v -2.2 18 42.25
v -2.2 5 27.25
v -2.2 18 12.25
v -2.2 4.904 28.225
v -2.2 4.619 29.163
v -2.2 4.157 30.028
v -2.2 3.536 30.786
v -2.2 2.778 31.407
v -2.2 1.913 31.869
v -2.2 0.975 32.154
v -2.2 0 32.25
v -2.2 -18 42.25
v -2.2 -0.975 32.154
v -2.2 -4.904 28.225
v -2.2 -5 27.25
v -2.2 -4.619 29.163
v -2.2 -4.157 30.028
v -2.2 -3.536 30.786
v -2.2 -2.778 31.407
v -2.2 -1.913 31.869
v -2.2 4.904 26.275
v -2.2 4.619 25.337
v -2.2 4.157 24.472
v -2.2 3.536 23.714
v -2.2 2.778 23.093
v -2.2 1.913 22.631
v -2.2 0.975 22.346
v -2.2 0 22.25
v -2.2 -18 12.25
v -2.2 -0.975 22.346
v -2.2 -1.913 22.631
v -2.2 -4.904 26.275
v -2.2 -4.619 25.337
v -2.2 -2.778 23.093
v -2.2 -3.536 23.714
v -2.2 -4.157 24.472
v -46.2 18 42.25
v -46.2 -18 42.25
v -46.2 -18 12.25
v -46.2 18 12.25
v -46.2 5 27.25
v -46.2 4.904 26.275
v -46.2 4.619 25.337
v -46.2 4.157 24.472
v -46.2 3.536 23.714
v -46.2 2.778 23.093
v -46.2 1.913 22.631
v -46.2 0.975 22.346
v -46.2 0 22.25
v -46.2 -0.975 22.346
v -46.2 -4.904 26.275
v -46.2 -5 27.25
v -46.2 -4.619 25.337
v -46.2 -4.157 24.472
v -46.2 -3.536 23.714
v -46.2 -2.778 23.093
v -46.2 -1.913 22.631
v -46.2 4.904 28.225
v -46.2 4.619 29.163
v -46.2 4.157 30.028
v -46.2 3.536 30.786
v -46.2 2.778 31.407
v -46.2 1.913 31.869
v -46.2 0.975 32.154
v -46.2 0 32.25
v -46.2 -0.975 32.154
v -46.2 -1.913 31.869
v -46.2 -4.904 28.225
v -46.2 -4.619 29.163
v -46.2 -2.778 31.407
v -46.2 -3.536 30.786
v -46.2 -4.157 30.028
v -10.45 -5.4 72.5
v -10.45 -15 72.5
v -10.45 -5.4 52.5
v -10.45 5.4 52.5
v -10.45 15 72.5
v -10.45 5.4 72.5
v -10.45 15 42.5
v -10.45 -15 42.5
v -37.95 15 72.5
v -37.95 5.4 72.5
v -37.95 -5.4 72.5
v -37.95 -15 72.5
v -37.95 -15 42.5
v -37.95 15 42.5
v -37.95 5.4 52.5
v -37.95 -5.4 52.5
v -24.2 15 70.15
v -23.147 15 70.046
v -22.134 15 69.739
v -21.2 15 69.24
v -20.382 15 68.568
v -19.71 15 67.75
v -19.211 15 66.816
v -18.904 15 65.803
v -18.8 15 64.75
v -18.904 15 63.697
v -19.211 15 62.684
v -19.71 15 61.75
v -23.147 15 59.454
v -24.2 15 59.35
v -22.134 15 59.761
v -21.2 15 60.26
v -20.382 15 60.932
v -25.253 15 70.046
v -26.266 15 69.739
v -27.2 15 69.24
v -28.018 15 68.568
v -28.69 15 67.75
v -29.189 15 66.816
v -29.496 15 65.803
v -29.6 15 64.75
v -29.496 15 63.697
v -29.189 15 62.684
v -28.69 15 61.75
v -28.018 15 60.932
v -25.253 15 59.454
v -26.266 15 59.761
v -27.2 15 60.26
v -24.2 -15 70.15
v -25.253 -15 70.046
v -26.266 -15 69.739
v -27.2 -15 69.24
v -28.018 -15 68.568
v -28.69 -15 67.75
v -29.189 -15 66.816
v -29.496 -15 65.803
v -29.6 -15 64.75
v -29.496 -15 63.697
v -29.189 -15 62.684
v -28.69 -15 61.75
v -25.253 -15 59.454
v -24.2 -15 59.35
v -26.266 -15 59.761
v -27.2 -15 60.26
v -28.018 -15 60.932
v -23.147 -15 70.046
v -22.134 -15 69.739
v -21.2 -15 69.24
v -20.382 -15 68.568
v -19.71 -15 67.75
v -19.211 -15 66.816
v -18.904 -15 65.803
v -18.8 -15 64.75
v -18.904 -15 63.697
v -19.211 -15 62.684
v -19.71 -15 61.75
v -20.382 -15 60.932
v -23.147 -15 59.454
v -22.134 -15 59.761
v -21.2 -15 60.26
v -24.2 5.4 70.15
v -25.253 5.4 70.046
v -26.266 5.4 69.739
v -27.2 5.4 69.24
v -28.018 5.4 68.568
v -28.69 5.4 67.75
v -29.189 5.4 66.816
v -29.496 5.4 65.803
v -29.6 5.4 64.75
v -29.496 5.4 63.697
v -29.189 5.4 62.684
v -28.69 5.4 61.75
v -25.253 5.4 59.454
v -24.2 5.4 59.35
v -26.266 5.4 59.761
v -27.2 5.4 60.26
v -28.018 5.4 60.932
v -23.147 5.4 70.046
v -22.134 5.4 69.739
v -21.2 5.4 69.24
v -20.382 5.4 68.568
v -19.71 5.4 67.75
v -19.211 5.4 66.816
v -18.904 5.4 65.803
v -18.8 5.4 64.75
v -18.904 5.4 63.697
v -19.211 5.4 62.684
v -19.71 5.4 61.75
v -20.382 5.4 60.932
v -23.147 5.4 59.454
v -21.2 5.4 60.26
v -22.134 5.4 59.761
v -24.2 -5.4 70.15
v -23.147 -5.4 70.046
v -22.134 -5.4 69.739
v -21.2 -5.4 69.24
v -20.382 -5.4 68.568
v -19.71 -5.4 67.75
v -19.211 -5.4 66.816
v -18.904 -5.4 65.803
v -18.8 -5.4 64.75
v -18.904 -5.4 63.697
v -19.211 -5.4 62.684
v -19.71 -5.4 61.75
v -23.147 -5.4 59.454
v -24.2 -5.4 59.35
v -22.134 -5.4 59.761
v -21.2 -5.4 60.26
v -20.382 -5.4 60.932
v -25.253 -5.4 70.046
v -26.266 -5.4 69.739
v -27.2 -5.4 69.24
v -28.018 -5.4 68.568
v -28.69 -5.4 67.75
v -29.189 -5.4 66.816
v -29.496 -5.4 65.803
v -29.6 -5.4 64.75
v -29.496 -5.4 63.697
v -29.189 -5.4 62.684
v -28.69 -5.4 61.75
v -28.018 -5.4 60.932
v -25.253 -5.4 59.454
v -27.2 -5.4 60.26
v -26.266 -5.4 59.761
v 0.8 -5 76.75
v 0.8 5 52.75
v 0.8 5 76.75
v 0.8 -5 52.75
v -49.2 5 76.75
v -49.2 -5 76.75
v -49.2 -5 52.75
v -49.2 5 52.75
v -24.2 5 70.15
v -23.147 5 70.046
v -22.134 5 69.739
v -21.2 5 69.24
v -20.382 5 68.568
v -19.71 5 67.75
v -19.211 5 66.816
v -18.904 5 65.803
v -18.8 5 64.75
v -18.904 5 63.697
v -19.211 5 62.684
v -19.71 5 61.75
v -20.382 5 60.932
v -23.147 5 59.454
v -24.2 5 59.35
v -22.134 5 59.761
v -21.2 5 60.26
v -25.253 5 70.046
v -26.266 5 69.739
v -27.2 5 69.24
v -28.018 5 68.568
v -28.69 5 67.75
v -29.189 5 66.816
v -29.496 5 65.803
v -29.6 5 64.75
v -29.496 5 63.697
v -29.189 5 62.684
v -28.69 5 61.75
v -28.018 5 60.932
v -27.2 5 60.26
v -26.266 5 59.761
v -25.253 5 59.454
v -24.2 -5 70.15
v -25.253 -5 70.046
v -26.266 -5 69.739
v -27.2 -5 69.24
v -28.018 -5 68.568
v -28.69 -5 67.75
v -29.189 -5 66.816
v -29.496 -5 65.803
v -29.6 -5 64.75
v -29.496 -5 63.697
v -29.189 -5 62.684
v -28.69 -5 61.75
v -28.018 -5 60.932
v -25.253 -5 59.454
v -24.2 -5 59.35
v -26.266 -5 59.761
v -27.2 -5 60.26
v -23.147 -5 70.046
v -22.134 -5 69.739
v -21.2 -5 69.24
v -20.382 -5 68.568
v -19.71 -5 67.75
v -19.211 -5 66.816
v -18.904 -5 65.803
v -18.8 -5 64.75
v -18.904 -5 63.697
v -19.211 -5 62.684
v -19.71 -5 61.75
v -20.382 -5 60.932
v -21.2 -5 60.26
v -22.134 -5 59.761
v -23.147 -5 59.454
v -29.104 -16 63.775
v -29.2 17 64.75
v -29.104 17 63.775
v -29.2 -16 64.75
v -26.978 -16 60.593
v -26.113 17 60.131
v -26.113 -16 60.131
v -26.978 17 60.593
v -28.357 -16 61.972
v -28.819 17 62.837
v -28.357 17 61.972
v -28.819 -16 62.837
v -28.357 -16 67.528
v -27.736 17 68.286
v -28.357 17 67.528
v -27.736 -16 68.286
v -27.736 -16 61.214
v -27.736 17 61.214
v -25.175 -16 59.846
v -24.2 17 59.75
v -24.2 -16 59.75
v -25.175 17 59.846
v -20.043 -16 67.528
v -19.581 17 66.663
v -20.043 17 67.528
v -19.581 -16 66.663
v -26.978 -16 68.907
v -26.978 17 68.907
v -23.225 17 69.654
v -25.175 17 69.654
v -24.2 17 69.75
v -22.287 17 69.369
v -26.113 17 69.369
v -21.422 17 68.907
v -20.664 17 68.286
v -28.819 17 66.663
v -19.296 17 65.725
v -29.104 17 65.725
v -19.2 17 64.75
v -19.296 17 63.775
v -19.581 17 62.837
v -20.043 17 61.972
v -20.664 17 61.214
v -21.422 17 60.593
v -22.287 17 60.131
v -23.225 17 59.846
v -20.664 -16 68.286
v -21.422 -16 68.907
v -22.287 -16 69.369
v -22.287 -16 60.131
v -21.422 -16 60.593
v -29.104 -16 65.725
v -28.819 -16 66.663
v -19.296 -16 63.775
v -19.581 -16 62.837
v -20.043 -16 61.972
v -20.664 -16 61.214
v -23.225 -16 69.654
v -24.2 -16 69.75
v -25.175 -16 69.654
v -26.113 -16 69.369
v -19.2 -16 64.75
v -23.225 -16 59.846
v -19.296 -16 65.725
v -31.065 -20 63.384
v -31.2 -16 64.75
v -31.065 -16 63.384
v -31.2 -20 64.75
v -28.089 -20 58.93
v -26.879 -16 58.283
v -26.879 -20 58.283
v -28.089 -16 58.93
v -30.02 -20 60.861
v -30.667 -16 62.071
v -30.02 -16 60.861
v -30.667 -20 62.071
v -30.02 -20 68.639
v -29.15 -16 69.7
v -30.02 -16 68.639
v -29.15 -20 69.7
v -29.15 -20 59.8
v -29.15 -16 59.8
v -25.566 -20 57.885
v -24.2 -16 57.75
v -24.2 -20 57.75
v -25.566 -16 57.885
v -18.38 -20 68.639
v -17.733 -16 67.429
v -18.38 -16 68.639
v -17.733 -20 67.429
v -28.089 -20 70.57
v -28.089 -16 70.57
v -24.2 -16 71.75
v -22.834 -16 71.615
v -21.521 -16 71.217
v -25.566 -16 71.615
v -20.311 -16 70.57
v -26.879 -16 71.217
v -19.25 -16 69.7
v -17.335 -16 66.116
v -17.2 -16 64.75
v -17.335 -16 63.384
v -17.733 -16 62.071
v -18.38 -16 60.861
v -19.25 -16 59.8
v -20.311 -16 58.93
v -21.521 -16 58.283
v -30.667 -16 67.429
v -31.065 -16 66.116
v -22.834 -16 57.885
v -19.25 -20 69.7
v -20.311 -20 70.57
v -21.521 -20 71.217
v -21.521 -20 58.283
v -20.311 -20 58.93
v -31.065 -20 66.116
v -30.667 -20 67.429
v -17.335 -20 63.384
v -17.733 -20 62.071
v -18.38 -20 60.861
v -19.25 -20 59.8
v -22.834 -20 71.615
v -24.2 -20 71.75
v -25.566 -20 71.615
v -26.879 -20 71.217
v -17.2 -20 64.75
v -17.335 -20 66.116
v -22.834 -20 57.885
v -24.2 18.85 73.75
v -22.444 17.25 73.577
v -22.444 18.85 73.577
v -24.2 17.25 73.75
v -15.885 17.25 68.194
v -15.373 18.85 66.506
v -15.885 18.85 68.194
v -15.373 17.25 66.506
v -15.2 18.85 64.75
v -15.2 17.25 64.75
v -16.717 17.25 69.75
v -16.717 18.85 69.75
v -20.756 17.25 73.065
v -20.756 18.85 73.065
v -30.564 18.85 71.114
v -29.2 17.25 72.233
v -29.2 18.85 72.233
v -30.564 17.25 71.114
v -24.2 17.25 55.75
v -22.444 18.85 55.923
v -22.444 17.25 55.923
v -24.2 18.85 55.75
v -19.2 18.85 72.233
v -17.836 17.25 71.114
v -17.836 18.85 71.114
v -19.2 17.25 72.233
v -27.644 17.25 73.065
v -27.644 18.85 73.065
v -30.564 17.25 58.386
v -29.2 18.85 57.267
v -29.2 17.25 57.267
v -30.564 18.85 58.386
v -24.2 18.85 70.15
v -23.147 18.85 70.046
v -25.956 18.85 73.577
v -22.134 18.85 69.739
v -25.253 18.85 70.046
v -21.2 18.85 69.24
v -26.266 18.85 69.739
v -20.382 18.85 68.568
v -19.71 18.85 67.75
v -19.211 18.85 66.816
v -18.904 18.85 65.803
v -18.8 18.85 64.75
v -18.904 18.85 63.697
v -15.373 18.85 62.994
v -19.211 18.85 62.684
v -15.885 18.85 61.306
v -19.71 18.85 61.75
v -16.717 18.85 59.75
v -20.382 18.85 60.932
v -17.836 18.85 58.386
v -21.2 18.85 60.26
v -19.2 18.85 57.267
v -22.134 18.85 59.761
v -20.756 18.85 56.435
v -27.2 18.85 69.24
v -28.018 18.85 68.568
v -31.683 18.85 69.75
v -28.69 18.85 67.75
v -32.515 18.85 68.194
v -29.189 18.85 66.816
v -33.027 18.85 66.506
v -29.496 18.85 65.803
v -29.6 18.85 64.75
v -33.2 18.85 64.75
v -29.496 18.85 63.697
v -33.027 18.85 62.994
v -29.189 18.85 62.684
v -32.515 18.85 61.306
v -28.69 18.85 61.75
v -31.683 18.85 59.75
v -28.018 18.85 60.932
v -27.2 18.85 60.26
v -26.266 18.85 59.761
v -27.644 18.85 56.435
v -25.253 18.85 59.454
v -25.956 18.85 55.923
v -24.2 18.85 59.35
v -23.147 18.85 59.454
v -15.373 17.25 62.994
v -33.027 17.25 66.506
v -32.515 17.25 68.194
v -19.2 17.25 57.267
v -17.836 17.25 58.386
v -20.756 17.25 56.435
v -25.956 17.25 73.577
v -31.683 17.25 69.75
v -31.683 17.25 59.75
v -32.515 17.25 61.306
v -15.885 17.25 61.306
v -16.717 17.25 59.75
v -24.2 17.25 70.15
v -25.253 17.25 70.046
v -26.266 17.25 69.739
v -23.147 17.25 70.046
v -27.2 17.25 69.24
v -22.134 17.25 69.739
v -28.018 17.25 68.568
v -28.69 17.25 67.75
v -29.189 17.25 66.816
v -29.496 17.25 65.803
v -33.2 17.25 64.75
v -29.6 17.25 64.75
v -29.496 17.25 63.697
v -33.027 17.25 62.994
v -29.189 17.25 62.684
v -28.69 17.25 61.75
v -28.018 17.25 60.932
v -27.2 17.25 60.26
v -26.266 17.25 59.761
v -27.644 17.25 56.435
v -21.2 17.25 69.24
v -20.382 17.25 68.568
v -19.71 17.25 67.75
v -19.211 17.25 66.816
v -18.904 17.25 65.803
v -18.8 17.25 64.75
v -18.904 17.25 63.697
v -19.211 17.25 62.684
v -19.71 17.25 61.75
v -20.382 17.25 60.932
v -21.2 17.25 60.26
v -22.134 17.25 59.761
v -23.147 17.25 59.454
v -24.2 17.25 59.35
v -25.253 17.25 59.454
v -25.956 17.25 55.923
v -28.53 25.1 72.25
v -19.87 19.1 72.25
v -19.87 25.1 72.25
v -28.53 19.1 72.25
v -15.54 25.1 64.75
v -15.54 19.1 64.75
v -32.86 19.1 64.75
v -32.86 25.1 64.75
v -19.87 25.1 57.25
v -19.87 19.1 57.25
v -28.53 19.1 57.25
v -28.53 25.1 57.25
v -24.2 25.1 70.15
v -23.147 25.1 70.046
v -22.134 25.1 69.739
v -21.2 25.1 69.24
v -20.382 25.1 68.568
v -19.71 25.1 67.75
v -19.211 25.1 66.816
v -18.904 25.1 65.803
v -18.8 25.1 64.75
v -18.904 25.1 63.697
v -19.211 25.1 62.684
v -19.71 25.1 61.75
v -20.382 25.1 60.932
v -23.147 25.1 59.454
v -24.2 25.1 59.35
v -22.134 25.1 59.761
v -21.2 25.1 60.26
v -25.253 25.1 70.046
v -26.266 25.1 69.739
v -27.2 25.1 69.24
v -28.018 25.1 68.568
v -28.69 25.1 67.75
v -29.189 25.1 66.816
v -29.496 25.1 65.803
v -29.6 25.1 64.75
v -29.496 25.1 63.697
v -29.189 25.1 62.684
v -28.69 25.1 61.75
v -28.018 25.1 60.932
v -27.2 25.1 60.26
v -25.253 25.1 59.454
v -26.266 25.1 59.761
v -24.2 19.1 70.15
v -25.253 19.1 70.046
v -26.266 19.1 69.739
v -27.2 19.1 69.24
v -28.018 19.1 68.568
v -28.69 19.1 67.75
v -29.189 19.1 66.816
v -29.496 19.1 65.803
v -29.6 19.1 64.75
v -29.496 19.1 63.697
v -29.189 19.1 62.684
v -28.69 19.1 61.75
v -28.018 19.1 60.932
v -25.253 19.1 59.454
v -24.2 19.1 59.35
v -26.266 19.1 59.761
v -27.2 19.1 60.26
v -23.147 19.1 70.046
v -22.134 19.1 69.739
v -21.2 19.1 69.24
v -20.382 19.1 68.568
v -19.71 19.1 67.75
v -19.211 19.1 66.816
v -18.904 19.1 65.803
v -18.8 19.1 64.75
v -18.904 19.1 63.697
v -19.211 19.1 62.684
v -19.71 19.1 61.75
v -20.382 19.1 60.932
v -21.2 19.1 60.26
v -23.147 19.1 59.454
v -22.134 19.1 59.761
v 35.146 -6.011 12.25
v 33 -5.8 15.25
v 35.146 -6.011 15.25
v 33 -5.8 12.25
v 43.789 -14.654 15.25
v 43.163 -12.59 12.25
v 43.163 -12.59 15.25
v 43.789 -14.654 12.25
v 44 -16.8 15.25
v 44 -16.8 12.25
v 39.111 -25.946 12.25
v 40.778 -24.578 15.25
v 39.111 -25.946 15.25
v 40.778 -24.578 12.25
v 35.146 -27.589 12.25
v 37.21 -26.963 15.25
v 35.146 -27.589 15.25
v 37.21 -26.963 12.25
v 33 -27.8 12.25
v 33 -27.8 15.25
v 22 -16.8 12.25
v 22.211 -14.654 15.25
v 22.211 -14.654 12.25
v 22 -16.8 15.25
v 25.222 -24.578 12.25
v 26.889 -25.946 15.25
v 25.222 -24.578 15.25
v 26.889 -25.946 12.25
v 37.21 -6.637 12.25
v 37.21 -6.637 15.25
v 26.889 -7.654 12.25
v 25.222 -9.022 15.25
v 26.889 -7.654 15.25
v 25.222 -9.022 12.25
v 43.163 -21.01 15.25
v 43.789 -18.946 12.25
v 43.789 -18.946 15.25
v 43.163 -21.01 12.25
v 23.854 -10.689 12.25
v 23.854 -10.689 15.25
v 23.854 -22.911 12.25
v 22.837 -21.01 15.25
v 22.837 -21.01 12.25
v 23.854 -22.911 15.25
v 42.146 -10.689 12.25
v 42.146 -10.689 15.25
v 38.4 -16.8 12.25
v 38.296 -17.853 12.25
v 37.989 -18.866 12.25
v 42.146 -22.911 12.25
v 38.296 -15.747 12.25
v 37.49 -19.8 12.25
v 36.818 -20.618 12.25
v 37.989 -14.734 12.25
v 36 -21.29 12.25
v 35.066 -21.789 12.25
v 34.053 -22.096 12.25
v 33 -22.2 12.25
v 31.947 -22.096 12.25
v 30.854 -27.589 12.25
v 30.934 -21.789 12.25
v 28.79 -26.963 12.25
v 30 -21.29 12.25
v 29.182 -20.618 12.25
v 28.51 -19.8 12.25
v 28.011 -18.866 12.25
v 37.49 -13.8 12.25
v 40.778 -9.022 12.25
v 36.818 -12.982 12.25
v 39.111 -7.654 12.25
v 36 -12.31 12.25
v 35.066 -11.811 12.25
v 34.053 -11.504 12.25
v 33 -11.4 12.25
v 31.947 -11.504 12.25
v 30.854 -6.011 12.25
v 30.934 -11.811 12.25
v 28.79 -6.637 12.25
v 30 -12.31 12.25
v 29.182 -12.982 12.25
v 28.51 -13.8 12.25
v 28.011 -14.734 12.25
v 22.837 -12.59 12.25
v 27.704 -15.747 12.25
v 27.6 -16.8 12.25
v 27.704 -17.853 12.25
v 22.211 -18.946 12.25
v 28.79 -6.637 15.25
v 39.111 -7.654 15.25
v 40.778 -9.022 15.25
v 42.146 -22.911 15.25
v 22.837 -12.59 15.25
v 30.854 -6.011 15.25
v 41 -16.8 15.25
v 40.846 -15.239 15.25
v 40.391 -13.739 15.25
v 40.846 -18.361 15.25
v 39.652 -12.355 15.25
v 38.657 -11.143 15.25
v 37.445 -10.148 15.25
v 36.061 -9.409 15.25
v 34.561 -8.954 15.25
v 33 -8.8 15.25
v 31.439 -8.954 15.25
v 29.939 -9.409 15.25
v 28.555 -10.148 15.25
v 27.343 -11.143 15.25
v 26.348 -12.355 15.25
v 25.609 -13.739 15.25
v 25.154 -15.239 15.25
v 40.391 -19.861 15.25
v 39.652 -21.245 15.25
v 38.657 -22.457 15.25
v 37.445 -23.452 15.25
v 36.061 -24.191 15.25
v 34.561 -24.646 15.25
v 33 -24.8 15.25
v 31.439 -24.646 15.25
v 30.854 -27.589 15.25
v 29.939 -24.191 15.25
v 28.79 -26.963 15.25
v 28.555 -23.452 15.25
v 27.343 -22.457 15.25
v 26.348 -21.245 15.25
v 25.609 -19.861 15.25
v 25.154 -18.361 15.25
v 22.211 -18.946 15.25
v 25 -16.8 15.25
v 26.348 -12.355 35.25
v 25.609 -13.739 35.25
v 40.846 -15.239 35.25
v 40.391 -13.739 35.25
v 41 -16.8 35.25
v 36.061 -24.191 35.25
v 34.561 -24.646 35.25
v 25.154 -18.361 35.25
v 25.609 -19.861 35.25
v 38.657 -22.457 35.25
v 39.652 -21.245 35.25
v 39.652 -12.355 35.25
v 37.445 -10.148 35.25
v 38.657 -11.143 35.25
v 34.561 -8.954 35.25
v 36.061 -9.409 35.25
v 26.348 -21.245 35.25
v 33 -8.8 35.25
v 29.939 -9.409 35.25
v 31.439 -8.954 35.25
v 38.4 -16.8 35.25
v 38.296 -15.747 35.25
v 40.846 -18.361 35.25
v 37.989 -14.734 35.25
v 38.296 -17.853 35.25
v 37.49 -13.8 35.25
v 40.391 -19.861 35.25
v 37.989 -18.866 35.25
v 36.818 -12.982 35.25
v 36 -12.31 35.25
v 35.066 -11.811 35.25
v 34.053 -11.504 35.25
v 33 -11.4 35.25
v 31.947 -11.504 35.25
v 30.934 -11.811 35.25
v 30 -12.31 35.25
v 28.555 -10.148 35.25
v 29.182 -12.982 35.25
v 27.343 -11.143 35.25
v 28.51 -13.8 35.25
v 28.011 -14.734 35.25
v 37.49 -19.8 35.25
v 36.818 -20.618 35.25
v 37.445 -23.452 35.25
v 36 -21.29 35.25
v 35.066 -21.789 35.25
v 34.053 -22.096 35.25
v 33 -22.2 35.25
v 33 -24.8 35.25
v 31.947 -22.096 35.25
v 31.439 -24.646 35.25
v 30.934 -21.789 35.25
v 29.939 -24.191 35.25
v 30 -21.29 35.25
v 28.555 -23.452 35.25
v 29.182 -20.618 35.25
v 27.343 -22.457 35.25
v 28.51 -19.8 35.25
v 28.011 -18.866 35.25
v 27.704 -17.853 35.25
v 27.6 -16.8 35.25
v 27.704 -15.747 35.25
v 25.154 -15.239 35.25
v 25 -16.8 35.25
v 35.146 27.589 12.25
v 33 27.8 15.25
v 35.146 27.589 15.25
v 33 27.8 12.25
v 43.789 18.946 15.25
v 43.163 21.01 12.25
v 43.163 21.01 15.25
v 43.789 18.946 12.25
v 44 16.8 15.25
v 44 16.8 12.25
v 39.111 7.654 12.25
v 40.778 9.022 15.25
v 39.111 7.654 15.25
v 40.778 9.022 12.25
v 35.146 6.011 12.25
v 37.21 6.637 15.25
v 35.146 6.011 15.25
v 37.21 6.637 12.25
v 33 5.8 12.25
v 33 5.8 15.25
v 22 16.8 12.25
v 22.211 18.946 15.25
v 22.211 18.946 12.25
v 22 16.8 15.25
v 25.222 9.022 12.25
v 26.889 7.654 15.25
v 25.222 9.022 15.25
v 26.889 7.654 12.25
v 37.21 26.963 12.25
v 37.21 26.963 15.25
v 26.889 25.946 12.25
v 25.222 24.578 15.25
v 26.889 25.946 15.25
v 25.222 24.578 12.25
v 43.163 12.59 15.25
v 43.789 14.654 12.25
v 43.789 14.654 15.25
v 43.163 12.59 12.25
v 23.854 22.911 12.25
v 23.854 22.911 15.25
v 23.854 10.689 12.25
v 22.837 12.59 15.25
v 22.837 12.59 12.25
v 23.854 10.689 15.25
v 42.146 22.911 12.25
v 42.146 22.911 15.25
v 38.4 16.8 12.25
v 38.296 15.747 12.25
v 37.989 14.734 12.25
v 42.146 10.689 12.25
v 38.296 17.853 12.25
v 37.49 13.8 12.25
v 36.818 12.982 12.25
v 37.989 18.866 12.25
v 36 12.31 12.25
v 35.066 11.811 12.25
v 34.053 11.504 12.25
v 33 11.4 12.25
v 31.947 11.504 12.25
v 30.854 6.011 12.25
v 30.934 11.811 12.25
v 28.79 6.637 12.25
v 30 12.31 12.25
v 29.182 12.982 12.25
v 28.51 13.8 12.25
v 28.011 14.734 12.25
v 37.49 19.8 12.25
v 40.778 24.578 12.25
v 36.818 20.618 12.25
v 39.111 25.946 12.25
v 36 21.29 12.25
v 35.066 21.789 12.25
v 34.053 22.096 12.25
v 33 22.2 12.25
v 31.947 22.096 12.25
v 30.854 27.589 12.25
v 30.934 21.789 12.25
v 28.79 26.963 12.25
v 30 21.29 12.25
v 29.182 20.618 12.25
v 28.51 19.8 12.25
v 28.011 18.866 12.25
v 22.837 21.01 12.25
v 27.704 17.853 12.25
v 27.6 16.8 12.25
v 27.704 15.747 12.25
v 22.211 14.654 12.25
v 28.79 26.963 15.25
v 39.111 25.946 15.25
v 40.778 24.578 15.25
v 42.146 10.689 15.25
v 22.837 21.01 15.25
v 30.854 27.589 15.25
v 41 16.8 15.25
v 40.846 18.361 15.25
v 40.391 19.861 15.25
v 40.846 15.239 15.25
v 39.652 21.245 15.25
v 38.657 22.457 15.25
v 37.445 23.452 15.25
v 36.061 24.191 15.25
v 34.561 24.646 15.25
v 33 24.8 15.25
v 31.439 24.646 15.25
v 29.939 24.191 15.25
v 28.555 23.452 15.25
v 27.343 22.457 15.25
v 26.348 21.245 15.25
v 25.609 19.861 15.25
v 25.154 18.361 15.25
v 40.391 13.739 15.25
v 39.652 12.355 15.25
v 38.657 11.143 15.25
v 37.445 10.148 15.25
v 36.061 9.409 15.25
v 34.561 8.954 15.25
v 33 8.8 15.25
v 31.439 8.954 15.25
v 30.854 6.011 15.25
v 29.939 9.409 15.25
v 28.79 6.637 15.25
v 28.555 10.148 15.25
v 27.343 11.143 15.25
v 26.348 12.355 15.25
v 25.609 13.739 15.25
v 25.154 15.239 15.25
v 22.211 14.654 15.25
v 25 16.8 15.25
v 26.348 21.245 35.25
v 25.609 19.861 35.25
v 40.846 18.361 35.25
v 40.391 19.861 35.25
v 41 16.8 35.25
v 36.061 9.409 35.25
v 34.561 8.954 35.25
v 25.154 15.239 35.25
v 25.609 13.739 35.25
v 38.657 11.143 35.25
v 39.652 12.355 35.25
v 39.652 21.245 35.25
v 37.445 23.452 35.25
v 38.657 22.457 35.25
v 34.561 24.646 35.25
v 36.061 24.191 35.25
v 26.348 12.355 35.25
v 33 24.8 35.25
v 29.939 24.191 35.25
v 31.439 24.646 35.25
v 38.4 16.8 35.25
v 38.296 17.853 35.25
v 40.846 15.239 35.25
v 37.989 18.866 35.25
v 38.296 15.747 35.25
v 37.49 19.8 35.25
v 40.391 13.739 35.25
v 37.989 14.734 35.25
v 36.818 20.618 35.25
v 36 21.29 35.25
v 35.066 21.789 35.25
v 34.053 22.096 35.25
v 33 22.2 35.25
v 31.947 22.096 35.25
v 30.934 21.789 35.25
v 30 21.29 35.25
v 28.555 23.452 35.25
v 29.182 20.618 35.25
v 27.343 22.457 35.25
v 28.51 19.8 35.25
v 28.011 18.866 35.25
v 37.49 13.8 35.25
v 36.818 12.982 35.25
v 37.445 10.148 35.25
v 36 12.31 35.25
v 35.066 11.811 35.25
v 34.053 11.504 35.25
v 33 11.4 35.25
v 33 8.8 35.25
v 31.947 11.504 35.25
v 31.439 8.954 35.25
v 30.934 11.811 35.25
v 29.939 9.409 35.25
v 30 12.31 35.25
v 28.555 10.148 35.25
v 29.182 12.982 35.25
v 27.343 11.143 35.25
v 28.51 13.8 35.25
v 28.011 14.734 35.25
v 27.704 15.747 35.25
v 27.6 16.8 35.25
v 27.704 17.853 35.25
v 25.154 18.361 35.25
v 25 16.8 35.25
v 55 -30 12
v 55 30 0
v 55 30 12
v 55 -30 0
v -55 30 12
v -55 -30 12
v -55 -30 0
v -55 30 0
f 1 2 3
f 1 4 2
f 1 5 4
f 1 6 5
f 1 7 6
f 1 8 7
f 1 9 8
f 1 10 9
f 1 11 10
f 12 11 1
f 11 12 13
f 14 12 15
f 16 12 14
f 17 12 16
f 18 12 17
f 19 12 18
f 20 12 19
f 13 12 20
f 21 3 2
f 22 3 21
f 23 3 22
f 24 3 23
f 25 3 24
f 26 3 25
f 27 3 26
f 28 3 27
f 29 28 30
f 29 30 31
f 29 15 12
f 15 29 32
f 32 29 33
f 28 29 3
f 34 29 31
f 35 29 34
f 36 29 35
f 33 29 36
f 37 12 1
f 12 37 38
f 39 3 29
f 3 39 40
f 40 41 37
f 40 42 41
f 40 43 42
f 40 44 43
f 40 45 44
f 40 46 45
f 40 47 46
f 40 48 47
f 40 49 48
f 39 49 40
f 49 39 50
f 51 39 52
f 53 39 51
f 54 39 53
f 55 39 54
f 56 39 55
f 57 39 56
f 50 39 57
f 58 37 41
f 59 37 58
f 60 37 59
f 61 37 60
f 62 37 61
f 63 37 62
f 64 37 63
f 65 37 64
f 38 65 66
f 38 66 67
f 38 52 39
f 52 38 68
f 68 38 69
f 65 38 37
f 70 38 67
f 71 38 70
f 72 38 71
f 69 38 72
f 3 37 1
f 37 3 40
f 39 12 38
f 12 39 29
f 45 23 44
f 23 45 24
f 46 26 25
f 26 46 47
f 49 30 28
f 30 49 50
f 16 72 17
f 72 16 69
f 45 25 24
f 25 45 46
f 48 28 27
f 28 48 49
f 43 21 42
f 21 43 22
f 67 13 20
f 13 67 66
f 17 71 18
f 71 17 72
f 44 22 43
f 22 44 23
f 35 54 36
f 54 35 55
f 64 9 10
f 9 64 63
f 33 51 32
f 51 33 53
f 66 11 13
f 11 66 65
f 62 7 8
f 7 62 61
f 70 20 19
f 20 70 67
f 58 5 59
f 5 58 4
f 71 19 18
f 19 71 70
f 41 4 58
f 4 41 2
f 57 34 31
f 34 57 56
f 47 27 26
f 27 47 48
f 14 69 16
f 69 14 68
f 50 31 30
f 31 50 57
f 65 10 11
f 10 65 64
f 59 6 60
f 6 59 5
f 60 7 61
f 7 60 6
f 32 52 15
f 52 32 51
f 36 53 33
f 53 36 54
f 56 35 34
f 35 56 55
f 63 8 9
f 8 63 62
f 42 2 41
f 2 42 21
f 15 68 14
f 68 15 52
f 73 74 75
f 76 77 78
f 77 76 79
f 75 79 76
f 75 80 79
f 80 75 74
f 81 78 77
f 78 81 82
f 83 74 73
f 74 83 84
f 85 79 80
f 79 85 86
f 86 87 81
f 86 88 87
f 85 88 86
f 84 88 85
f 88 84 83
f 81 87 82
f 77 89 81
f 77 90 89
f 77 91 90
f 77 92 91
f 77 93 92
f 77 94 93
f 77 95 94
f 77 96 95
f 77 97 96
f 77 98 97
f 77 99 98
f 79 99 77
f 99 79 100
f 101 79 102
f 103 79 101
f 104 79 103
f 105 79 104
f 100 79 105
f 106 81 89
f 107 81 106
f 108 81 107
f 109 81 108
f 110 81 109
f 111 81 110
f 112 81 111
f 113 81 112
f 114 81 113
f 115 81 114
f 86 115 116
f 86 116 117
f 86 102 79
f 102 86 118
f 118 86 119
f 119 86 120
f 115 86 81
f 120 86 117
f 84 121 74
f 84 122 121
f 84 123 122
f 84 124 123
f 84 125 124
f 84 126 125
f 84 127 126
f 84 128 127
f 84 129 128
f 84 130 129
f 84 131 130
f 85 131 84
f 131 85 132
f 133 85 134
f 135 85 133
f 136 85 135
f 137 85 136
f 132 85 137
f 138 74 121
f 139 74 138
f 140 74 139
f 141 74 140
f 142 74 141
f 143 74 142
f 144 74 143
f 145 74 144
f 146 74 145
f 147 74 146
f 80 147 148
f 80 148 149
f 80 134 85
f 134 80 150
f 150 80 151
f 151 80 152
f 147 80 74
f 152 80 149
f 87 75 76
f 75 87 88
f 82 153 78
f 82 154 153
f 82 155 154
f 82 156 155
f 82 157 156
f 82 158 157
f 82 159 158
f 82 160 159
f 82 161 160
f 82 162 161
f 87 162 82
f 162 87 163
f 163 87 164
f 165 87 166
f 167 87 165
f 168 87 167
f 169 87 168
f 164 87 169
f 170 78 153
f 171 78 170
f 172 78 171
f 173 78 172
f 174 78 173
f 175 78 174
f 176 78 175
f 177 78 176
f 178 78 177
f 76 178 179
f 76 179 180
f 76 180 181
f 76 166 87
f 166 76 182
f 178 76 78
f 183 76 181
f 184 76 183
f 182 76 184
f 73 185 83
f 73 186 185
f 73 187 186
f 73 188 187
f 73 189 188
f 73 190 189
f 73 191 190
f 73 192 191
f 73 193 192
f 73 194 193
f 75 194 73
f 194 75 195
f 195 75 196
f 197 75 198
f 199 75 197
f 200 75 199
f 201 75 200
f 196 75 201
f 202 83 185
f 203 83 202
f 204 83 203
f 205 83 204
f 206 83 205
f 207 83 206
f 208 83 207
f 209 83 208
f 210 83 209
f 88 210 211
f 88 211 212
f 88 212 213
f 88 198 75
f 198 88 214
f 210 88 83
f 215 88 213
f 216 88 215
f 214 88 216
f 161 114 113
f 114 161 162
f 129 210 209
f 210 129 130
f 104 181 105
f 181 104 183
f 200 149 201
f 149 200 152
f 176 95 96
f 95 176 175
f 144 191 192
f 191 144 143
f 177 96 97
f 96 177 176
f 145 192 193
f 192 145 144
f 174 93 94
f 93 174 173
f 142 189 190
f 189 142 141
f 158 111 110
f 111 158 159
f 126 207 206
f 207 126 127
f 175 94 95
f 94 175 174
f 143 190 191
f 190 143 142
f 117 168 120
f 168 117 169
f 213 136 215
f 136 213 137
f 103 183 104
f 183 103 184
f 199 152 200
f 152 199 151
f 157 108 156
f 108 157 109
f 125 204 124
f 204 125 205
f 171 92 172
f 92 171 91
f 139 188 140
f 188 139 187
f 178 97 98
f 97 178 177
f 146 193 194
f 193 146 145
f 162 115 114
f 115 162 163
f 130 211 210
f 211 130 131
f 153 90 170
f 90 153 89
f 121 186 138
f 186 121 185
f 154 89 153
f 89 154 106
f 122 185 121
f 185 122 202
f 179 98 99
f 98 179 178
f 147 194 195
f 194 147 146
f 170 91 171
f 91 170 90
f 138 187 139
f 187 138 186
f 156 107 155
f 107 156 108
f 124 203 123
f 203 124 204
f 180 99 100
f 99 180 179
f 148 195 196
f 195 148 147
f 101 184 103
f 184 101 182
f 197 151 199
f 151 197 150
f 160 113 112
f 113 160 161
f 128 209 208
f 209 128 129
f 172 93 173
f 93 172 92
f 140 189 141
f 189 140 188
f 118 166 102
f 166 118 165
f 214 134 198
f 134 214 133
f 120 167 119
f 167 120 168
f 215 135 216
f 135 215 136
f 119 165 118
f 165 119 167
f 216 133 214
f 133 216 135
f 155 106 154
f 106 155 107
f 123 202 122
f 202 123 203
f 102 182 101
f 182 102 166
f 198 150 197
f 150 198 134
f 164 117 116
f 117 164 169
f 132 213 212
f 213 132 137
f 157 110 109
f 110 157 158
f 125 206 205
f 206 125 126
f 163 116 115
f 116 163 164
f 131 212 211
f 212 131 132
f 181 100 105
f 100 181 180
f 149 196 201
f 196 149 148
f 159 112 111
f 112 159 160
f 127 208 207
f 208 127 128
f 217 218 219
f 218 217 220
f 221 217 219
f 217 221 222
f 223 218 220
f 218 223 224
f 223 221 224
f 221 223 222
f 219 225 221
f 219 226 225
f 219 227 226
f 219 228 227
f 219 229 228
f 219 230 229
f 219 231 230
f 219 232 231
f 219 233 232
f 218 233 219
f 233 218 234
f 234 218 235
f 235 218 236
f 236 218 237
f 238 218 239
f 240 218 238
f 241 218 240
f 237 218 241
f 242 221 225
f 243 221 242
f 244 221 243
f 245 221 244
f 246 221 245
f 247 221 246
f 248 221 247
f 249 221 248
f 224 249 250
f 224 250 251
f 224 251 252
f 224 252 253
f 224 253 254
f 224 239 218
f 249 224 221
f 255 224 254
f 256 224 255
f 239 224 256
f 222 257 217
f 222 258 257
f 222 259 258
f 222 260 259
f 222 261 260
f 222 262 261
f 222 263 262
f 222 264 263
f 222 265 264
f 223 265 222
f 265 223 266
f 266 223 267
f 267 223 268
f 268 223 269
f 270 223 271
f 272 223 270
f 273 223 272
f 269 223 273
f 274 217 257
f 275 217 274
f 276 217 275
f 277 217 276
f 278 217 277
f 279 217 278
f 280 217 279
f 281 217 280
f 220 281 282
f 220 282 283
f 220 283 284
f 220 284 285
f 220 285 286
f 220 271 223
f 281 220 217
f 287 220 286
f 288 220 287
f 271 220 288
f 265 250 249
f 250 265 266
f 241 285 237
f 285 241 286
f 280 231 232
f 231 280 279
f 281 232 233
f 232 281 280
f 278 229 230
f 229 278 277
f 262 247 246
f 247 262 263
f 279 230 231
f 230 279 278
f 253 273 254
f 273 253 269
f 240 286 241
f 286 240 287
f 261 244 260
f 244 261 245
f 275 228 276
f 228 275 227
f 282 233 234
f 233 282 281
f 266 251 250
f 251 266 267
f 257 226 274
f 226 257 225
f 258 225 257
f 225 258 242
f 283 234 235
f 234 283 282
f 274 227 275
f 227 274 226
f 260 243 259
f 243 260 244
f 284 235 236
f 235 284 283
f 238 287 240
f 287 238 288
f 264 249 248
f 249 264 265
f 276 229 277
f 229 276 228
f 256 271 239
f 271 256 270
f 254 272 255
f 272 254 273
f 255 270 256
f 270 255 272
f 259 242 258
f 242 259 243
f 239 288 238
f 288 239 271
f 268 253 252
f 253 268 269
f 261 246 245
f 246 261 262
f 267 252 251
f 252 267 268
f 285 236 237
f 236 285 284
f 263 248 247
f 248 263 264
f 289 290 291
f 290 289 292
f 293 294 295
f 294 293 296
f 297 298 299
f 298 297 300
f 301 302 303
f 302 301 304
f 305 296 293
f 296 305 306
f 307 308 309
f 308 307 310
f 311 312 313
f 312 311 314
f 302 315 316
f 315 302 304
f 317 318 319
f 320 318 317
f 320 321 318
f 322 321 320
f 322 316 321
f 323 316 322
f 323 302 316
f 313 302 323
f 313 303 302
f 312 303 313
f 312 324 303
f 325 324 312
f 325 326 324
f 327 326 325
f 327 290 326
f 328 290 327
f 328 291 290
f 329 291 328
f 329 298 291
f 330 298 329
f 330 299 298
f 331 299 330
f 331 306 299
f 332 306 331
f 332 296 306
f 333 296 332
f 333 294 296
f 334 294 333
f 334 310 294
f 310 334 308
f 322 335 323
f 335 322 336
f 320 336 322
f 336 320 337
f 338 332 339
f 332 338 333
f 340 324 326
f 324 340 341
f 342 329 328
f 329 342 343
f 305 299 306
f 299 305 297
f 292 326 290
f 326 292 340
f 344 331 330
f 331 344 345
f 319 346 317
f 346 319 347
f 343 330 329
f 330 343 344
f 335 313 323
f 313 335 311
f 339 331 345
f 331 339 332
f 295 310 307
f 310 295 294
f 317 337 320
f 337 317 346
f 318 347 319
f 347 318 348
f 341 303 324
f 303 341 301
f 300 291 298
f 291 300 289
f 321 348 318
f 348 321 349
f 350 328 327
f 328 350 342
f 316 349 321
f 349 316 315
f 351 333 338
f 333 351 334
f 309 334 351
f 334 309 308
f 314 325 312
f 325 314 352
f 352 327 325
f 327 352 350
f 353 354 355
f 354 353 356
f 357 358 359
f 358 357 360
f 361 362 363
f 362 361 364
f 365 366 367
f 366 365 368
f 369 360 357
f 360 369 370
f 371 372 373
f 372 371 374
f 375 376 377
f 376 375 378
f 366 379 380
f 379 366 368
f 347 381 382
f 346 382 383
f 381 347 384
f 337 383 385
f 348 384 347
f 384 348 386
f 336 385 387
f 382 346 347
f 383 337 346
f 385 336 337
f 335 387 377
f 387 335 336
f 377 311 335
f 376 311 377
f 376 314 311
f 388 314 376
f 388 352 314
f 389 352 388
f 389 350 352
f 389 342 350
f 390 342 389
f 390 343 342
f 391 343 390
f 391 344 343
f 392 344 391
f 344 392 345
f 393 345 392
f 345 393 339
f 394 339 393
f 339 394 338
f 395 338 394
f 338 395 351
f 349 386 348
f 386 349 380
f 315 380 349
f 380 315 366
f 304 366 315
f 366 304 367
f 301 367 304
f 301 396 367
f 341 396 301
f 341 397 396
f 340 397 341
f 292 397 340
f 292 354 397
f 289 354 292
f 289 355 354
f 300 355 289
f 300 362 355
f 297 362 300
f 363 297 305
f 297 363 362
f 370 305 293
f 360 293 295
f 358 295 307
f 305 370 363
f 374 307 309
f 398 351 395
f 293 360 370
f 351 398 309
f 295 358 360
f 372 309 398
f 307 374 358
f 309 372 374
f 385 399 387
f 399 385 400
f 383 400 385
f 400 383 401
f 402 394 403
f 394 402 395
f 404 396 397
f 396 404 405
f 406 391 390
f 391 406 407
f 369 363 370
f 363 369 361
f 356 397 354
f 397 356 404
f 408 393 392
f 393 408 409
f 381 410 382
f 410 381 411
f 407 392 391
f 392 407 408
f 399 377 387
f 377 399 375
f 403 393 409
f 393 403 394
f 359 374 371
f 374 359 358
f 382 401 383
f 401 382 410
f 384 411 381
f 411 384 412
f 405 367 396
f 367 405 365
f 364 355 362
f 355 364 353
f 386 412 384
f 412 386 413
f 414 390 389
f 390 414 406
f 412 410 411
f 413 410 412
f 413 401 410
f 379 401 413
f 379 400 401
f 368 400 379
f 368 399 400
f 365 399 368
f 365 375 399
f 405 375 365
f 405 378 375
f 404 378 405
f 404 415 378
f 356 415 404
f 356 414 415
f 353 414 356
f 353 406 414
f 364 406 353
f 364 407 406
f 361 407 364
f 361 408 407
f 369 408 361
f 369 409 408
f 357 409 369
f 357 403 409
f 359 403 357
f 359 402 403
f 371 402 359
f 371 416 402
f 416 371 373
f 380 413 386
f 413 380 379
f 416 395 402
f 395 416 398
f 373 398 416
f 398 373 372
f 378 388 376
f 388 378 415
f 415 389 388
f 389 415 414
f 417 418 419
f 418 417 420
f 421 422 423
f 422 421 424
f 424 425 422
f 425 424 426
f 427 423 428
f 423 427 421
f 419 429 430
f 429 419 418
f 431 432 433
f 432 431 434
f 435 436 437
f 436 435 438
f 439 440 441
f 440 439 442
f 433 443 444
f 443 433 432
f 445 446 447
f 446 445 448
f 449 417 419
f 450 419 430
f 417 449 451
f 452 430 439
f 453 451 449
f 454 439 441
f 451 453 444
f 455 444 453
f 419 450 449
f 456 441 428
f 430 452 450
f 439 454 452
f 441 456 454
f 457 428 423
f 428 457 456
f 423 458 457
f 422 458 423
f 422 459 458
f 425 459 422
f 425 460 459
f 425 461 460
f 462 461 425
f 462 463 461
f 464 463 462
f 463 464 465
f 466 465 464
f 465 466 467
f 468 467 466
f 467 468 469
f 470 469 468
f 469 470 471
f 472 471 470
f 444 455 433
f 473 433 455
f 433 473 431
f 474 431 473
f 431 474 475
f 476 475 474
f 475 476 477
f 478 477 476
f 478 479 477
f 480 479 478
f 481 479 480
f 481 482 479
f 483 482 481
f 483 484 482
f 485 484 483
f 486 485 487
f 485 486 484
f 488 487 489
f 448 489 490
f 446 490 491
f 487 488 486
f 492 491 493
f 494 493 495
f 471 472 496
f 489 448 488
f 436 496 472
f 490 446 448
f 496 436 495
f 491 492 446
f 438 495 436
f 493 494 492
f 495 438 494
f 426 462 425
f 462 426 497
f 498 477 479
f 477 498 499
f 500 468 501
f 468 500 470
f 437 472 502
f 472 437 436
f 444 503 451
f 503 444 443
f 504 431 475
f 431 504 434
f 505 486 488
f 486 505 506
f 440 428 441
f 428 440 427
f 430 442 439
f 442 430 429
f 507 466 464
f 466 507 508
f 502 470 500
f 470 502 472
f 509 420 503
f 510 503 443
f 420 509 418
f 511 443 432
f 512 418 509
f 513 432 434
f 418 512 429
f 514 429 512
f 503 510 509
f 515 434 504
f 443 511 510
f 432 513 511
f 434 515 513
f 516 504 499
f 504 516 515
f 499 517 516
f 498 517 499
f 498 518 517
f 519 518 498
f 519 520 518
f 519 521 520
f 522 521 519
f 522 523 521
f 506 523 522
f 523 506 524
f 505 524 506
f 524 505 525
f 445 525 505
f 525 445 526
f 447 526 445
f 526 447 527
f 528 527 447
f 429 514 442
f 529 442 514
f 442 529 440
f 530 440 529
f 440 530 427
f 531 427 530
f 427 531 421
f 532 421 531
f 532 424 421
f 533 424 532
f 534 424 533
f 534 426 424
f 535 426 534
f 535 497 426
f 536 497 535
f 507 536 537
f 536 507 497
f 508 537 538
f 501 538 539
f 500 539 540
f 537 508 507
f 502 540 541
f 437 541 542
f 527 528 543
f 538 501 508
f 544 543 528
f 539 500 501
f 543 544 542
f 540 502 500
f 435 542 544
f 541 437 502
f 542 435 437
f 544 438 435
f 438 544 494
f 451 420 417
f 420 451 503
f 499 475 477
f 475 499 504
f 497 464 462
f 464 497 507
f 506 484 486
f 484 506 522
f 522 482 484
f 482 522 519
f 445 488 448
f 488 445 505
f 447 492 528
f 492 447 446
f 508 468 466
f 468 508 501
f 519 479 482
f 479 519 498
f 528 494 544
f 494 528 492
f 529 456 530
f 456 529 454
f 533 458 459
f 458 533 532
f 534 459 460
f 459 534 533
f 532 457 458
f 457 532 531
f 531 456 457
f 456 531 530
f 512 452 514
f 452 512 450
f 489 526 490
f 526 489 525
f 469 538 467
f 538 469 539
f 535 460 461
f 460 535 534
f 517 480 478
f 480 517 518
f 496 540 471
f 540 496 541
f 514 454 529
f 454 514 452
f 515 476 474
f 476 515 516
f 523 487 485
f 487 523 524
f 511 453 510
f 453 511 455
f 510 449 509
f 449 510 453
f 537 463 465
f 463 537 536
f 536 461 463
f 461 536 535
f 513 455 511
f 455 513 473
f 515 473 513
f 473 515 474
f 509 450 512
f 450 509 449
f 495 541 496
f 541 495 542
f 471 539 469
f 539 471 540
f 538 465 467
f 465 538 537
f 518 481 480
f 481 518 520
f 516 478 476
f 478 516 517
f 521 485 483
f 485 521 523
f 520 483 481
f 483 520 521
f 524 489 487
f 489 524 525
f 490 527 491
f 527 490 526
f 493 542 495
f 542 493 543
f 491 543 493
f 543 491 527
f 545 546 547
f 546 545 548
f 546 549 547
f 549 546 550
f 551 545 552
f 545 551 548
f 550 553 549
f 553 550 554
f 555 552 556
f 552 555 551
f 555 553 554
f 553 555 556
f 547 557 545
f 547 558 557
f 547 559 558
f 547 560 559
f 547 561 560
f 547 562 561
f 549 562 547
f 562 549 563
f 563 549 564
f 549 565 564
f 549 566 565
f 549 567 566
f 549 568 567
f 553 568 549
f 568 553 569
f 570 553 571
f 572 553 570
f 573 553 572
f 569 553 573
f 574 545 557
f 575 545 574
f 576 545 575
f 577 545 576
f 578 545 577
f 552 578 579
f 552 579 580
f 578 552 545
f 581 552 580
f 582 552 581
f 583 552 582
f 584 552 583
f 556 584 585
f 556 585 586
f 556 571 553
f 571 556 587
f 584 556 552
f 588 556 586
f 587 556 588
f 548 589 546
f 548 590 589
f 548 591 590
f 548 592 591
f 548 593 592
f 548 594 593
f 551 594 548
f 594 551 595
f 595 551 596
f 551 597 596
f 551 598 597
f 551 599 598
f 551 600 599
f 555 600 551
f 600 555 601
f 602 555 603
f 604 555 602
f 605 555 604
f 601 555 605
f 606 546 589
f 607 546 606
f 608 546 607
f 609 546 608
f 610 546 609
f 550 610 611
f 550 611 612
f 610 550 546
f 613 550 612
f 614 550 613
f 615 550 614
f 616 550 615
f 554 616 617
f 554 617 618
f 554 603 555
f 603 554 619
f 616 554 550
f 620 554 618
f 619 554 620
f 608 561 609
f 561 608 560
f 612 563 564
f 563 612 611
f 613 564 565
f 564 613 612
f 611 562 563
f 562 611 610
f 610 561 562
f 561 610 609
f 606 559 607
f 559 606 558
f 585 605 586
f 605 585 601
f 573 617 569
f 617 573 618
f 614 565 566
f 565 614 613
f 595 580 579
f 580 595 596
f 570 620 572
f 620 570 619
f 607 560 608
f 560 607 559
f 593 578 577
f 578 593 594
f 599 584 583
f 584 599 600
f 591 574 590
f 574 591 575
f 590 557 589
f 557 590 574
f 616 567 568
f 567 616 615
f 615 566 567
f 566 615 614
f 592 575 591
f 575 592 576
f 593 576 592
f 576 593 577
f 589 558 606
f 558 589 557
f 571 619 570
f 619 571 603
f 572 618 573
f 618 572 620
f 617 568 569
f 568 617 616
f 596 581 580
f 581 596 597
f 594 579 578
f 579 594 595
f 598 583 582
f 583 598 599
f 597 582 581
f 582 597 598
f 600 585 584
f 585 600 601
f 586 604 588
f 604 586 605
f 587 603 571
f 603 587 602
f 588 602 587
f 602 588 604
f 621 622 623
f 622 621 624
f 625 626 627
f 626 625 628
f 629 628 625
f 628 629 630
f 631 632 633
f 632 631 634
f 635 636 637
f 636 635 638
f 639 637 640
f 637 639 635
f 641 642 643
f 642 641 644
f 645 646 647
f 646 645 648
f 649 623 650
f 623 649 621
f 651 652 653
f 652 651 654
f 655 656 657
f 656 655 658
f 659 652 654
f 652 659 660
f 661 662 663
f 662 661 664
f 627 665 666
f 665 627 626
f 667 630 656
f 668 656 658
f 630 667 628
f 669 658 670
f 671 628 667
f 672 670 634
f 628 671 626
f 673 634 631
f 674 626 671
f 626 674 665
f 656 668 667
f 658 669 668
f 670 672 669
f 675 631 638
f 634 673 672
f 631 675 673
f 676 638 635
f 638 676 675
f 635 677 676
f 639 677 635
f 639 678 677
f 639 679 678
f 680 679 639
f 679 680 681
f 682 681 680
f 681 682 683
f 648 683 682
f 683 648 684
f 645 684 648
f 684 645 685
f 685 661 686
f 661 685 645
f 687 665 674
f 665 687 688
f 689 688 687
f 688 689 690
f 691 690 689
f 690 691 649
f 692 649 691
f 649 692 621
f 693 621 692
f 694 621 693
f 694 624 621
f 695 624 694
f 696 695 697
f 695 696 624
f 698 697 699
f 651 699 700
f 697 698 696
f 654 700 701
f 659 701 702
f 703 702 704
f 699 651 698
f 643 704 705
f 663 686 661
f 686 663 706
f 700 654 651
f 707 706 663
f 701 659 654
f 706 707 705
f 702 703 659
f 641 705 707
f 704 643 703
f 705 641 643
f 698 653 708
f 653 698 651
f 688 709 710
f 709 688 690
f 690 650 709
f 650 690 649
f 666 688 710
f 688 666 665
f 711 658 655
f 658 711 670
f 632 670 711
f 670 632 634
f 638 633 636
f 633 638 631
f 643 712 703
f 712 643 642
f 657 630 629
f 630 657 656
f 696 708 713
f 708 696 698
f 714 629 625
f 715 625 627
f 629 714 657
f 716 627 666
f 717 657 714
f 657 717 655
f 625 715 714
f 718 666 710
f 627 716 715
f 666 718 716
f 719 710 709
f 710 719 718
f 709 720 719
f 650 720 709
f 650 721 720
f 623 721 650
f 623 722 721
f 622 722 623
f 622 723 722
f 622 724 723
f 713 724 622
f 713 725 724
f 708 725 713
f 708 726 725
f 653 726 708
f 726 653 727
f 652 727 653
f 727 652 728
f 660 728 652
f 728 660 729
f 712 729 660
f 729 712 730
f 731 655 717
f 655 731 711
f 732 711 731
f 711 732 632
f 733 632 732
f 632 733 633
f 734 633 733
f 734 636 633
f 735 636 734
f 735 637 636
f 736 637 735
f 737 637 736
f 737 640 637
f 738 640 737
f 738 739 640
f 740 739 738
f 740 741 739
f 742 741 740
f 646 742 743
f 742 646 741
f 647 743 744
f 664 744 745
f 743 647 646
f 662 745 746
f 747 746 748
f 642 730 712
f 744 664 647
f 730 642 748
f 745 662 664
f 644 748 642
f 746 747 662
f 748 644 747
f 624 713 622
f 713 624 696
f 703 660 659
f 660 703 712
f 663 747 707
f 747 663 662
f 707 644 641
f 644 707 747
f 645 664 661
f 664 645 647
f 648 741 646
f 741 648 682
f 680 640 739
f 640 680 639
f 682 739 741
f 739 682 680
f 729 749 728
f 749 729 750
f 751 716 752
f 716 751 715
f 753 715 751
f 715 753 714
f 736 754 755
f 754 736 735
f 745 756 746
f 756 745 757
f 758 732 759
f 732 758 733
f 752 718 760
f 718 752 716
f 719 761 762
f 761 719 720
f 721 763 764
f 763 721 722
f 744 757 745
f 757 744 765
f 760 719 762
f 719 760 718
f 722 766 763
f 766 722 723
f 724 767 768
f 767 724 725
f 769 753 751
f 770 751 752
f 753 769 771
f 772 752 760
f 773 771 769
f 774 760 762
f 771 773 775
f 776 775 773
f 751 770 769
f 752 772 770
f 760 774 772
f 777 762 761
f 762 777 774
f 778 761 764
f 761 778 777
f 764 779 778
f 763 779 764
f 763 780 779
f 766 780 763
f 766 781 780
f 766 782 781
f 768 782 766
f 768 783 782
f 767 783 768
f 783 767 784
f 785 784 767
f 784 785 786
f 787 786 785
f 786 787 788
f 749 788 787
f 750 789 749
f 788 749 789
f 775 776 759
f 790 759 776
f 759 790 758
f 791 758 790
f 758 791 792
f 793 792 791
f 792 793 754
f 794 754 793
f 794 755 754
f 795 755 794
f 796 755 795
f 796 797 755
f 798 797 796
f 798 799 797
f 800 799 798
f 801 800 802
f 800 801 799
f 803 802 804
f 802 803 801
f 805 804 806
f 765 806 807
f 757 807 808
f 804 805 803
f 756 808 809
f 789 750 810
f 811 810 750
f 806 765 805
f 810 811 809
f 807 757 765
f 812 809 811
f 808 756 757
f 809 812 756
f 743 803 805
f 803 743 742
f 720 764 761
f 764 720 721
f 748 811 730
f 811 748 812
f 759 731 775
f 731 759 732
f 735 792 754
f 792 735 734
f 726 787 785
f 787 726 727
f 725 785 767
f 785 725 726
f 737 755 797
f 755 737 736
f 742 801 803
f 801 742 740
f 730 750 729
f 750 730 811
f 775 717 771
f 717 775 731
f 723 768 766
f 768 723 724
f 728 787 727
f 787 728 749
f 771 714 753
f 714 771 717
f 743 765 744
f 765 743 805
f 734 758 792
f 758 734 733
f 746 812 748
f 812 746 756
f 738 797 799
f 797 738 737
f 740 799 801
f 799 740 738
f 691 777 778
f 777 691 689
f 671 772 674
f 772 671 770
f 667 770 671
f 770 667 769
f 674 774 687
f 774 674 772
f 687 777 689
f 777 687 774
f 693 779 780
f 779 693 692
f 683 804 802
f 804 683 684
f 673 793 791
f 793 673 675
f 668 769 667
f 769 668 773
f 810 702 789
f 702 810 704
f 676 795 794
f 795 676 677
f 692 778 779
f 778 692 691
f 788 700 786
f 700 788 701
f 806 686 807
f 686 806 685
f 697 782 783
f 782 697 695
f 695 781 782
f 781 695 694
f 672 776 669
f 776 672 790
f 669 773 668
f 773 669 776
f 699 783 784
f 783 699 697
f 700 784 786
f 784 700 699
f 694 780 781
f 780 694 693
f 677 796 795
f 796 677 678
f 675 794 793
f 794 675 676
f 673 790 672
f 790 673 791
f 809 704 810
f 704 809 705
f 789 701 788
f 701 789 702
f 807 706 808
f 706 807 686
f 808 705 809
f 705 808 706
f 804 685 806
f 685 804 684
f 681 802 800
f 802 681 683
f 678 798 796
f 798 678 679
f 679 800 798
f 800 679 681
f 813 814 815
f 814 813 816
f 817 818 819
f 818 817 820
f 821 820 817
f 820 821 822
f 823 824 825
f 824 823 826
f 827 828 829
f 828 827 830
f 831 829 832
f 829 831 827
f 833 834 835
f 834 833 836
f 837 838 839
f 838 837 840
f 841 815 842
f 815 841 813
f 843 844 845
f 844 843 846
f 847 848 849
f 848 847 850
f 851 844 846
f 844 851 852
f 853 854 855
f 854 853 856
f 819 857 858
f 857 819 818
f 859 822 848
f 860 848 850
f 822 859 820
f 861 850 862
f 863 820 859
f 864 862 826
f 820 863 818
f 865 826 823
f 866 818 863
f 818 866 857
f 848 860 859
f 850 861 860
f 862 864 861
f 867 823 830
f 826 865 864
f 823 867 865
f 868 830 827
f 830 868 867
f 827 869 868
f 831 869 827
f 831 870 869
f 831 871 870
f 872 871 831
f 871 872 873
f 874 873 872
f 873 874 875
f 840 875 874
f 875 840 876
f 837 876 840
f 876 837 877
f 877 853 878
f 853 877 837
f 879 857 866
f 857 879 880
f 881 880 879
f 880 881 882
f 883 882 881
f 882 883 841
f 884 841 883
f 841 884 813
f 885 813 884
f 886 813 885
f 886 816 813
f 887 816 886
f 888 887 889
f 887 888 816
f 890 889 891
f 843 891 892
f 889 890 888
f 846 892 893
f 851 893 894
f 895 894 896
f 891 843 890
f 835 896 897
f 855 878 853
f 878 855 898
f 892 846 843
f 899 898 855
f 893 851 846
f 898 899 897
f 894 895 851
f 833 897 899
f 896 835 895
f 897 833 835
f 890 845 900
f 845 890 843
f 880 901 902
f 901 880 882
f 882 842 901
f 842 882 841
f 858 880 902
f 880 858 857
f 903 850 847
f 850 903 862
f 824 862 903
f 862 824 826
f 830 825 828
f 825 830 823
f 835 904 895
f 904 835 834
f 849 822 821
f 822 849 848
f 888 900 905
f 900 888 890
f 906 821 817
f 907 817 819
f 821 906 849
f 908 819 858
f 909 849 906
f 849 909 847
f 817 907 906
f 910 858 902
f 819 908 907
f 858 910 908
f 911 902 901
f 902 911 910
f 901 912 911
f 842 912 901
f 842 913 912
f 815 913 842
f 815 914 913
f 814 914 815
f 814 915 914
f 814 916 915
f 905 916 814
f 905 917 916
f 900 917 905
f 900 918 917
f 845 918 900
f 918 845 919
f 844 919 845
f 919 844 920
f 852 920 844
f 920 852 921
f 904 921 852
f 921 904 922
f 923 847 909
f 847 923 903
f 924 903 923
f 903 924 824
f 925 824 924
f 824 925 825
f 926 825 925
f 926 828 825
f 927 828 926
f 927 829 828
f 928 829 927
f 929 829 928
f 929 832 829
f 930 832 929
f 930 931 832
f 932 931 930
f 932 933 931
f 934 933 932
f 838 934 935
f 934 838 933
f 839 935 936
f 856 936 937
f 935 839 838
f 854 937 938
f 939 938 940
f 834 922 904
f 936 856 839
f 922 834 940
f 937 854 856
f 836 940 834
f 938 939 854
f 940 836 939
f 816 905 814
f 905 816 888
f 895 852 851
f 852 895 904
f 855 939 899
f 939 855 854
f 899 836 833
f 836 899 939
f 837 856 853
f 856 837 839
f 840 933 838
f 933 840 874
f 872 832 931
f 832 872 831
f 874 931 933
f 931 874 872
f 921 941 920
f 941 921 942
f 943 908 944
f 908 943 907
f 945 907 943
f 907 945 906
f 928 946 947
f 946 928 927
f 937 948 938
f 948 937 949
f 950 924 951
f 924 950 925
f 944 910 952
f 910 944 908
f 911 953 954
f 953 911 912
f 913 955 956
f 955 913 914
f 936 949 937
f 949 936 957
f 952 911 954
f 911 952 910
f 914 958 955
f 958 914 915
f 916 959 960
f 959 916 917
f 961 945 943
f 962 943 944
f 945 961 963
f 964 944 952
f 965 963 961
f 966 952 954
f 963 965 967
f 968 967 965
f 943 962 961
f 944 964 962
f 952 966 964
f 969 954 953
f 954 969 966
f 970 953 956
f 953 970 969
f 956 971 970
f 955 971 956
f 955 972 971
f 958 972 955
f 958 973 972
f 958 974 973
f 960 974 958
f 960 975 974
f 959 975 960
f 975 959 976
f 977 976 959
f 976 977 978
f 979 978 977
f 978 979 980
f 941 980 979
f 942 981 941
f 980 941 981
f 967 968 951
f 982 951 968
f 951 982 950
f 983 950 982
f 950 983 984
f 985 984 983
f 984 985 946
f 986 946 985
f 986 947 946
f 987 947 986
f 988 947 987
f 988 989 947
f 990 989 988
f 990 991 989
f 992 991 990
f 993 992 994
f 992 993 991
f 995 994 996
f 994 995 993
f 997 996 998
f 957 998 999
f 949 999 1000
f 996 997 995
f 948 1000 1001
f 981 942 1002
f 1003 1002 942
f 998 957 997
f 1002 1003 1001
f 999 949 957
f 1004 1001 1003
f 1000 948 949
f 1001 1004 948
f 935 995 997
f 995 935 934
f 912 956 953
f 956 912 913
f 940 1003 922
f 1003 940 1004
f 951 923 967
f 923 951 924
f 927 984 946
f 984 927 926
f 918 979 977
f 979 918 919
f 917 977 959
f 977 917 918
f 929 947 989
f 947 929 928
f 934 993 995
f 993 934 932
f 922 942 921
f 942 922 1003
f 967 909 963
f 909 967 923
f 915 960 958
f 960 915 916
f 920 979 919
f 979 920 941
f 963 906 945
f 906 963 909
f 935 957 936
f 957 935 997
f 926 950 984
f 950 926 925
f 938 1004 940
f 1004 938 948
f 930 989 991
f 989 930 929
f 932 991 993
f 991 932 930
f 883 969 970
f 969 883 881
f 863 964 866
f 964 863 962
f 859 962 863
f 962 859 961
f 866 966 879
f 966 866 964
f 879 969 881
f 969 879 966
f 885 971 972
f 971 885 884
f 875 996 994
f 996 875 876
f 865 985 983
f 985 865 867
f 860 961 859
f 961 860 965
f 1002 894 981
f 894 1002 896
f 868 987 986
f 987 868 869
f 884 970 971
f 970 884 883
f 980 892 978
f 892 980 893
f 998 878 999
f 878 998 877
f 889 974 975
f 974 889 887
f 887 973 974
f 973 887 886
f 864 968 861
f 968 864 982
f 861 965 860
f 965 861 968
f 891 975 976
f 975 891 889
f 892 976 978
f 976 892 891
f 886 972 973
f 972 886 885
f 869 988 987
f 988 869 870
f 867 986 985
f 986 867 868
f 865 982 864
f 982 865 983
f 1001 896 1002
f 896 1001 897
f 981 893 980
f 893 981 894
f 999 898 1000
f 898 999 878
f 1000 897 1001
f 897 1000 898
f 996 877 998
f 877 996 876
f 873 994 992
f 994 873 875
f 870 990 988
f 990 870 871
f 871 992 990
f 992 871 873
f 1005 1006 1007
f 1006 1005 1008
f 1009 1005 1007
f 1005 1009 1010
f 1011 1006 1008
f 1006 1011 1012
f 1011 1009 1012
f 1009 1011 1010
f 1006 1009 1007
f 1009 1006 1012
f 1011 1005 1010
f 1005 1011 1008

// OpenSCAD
$fn = 32;

// ------------------------------------------------------------------------
// Indexing jig: plate 110 x 60 mm, pin d10
// Every part is its own module, assembly() places every instance.
// ------------------------------------------------------------------------

// --- part 1 ---
module jig_plate() {
  difference() {
    translate([-55, -30, 0]) cube([110, 60, 12]);
  }
}

// --- part 2 ---
module locator_block() {
  difference() {
    translate([-22, -18, 0]) cube([44, 36, 30]);
    translate([0, 0, 15]) rotate([0, 90, 0]) cylinder(h = 46, d = 10, center = true);
  }
}

// --- part 3 ---
module index_fork() {
  difference() {
    translate([-13.75, -15, 0]) cube([27.5, 30, 30]);
    translate([-14.75, -5.4, 10]) cube([29.5, 10.8, 21]);
    translate([0, 0, 22.25]) rotate([90, 0, 0]) cylinder(h = 32, d = 10.8, center = true);
  }
}

// --- part 4 ---
module index_arm() {
  difference() {
    translate([-25, -5, 0]) cube([50, 10, 24]);
    translate([0, 0, 12]) rotate([90, 0, 0]) cylinder(h = 12, d = 10.8, center = true);
  }
}

// --- part 5 ---
module index_pin() {
  rotate([0, 90, 0]) cylinder(h = 34, d = 10, center = true);
  translate([-20, 0, 0]) rotate([0, 90, 0]) cylinder(h = 4, d = 14);
}

// --- part 6 ---
module pin_washer() {
  difference() {
      translate([0, 0, 0]) cylinder(h = 1.6, d = 18);
      translate([0, 0, -1]) cylinder(h = 3.6, d = 10.8);
    }
}

// --- part 7 ---
module lock_nut() {
  difference() {
    linear_extrude(height = 6) polygon(points = [[8.66, 0], [4.33, 7.5], [-4.33, 7.5], [-8.66, 0], [-4.33, -7.5], [4.33, -7.5]]);
    translate([0, 0, -1]) cylinder(h = 8, d = 10.8);
  }
}

// --- part 8 ---
module guide_bush_a() {
  difference() {
    union() {
      cylinder(h = 3, d = 22);
      translate([0, 0, 3]) cylinder(h = 20, d = 16);
    }
    translate([0, 0, -1]) cylinder(h = 25, d = 10.8);
  }
}

// --- part 9 ---
module guide_bush_b() {
  difference() {
    union() {
      cylinder(h = 3, d = 22);
      translate([0, 0, 3]) cylinder(h = 20, d = 16);
    }
    translate([0, 0, -1]) cylinder(h = 25, d = 10.8);
  }
}

// --- assembly ---
module assembly() {
  color([0.80, 0.24, 0.20]) translate([0, 0, 0]) rotate([0, 0, 0]) jig_plate();
  color([0.20, 0.45, 0.75]) translate([-24.2, 0, 12.25]) rotate([0, 0, 0]) locator_block();
  color([0.25, 0.62, 0.32]) translate([-24.2, 0, 42.5]) rotate([0, 0, 0]) index_fork();
  color([0.92, 0.70, 0.18]) translate([-24.2, 0, 52.75]) rotate([0, 0, 0]) index_arm();
  color([0.58, 0.35, 0.70]) translate([-24.2, 0, 64.75]) rotate([0, 0, 90]) index_pin();
  color([0.16, 0.66, 0.66]) translate([-24.2, 18.85, 64.75]) rotate([90, 0, 0]) pin_washer();
  color([0.85, 0.48, 0.18]) translate([-24.2, 25.1, 64.75]) rotate([90, 0, 0]) lock_nut();
  color([0.55, 0.60, 0.65]) translate([33, -16.8, 12.25]) rotate([0, 0, 0]) guide_bush_a();
  color([0.75, 0.30, 0.55]) translate([33, 16.8, 12.25]) rotate([0, 0, 0]) guide_bush_b();
}

assembly();
